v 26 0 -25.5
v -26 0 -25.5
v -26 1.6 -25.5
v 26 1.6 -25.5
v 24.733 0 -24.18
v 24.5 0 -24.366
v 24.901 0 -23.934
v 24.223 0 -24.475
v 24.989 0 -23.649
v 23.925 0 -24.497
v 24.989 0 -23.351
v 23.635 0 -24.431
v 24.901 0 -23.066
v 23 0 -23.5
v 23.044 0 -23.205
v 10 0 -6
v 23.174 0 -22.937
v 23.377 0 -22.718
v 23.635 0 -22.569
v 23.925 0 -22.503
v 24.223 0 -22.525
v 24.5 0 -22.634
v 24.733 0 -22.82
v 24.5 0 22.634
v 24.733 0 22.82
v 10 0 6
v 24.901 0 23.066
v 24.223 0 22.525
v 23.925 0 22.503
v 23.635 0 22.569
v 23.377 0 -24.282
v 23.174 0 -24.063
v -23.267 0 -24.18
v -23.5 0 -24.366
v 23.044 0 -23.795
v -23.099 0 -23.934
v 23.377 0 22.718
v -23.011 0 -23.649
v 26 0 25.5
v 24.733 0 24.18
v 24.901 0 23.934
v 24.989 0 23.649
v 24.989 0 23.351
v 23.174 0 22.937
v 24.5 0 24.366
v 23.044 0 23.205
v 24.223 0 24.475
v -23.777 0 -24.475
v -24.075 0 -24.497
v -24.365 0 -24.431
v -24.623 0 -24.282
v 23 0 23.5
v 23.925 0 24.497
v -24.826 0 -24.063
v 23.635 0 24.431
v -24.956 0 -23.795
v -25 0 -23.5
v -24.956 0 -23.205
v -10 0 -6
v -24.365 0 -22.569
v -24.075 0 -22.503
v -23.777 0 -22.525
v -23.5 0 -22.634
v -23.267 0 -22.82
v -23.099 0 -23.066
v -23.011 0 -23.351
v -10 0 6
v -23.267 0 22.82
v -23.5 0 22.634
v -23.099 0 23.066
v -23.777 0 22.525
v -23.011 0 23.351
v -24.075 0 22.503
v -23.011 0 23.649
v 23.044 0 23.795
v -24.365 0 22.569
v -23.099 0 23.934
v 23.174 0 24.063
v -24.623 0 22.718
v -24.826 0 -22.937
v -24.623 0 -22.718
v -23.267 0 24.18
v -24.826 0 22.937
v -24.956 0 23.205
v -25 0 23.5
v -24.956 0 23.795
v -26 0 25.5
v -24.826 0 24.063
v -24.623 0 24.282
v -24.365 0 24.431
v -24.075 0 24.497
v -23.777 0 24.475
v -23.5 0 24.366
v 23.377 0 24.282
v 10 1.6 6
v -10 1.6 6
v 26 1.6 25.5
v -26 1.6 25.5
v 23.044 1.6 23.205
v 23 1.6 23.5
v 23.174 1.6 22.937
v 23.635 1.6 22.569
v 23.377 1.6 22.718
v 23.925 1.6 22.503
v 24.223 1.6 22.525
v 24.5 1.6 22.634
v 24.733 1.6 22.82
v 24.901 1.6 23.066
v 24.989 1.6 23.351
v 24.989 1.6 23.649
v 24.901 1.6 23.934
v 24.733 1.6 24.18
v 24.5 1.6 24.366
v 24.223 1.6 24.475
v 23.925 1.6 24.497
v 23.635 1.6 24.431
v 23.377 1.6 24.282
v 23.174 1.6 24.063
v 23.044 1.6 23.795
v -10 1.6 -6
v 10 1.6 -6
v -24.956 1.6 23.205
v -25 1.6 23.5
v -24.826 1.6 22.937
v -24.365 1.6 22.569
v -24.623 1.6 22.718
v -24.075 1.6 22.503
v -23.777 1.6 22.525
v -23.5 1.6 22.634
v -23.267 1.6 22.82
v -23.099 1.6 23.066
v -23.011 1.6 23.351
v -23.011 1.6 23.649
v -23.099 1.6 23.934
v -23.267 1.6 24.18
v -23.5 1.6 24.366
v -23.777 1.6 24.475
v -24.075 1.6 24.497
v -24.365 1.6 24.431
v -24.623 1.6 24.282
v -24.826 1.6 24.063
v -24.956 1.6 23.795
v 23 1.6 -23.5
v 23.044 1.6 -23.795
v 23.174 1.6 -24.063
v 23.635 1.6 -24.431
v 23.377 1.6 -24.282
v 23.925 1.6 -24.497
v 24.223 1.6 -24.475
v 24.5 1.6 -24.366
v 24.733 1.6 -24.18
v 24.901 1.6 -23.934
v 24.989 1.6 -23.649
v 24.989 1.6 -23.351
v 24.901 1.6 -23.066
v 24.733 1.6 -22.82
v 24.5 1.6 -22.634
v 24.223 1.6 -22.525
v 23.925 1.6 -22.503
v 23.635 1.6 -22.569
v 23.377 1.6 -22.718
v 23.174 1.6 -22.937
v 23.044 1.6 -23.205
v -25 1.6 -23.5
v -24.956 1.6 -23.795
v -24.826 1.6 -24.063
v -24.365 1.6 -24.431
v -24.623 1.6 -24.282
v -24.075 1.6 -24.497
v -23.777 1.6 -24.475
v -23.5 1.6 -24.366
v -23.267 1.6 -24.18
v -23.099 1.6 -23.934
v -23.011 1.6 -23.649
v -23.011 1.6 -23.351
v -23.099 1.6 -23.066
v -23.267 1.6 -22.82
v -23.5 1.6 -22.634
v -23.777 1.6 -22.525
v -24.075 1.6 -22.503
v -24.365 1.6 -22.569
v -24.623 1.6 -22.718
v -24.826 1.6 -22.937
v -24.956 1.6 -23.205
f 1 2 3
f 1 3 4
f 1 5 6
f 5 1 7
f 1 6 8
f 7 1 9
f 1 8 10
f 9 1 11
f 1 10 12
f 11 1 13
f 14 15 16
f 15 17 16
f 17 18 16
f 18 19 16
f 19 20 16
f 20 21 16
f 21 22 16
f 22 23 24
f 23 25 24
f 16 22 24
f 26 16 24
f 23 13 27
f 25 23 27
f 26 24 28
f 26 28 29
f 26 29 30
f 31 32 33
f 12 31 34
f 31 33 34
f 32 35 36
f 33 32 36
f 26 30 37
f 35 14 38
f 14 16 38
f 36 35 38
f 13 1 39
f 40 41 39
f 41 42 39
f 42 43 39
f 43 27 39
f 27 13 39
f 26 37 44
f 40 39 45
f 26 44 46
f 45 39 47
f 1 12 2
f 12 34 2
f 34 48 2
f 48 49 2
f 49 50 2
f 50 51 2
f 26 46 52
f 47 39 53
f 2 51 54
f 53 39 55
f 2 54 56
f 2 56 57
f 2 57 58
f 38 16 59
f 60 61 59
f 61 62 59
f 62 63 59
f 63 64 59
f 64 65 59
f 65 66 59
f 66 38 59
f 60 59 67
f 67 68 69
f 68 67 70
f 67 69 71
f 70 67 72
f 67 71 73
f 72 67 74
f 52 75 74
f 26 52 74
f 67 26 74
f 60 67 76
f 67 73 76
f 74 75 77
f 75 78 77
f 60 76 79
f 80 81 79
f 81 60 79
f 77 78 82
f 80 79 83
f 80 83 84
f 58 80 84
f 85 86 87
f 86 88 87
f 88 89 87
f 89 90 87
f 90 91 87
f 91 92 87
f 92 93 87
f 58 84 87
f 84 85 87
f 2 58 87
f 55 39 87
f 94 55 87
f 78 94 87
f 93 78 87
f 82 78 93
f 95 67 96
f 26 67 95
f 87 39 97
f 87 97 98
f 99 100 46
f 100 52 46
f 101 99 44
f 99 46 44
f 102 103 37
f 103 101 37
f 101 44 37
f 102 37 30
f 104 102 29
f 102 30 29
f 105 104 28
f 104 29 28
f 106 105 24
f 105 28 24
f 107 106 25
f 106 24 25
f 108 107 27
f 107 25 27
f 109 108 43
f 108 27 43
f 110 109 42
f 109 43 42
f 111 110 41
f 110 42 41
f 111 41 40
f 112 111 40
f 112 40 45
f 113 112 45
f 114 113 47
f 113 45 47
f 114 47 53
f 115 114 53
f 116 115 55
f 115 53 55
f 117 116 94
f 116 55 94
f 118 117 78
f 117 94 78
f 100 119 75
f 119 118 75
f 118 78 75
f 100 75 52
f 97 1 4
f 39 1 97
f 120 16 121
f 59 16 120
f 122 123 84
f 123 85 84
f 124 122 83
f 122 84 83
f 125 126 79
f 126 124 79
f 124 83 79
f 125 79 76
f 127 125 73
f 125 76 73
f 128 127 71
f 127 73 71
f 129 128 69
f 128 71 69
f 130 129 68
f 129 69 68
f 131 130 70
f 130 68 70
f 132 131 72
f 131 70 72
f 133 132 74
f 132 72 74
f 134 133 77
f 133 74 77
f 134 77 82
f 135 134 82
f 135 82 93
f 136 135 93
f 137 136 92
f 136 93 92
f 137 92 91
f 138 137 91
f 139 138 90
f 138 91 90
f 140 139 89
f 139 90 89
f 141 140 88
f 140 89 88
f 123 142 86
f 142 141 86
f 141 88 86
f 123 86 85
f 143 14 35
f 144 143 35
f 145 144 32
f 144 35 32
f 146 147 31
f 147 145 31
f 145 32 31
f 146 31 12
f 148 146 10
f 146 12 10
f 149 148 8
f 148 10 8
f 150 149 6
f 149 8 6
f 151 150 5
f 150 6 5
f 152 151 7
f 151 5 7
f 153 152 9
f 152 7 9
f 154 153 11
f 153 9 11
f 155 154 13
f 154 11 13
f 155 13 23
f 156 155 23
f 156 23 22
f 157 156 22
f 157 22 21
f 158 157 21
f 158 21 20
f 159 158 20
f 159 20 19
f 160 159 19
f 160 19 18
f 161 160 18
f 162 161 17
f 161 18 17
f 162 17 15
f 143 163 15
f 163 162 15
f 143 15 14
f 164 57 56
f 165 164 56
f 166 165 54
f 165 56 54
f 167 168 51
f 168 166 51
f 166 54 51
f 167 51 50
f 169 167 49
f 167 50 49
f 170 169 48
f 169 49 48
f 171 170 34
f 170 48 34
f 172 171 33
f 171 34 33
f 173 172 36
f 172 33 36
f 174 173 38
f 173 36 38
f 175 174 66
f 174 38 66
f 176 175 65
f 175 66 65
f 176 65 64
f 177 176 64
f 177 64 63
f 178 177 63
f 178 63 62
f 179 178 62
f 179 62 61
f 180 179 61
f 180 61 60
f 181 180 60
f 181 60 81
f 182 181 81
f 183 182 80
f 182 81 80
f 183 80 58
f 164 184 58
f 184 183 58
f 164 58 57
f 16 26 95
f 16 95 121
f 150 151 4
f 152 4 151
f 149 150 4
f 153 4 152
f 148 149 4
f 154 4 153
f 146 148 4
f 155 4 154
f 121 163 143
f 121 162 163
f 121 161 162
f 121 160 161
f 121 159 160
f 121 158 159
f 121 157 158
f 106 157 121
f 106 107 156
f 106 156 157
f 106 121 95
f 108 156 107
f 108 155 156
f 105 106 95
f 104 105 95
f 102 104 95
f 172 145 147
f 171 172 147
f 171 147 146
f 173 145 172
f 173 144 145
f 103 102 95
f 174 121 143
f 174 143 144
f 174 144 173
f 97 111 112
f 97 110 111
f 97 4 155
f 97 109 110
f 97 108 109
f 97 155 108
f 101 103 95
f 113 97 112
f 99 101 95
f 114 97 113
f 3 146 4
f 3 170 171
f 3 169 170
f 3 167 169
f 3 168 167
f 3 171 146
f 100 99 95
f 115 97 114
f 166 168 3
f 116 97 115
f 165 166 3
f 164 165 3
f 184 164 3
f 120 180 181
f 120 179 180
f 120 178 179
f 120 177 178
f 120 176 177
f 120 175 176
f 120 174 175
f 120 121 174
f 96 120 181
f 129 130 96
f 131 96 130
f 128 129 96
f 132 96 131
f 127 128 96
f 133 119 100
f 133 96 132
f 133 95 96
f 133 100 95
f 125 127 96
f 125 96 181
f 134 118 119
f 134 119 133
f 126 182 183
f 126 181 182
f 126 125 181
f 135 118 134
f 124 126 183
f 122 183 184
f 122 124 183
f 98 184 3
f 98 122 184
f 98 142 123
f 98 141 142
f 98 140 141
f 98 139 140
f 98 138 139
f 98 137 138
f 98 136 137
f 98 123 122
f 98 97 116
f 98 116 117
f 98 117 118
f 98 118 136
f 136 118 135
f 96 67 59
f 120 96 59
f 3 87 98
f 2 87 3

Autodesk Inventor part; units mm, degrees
ref_plane "YZ Plane" through (0, 0, 0) normal (1, 0, 0) x (0, 1, 0)
ref_plane "XZ Plane" through (0, 0, 0) normal (0, 1, 0) x (-1, 0, 0)
ref_plane "XY Plane" through (0, 0, 0) normal (0, 0, 1) x (1, 0, 0)
sketch "Sketch2" plane through (0, 0, 0) normal (0, 1, 0) x (-1, 0, 0)
  line L0 (-26, 25.5) -> (26, 25.5)
  line L1 (26, 25.5) -> (26, -25.5)
  line L2 (26, -25.5) -> (-26, -25.5)
  line L3 (-26, -25.5) -> (-26, 25.5)
  line L4 (-26, 25.5) -> (26, -25.5) construction
  line L5 (26, 25.5) -> (-26, -25.5) construction
  circle A0 centre (24, 23.5) radius 1
  circle A1 centre (24, -23.5) radius 1
  circle A2 centre (-24, 23.5) radius 1
  circle A3 centre (-24, -23.5) radius 1
  line L6 (10, 6) -> (-10, 6)
  line L7 (-10, -6) -> (10, -6)
  line L8 (10, 6) -> (-10, -6) construction
  line L9 (-10, 6) -> (10, -6) construction
  line L10 (10, 6) -> (10, -6)
  line L11 (-10, 6) -> (-10, -6)
  point P0 (0, 0)
  dimension "d2" = 52
  dimension "d3" = 51
  dimension "d4" = 2
  dimension "d5" = 2
  dimension "d6" = 2
  dimension "d9" = 47
  dimension "d12" = 48
  dimension "d17" = 20
  dimension "d18" = 12
extrude "Extrusion2" add sketch "Sketch2" along normal blind 1.6
equation "\"d5\" = d4"
equation "\"d6\" = d4"
properties part number "rapoukMotherboardConnectorv0"
